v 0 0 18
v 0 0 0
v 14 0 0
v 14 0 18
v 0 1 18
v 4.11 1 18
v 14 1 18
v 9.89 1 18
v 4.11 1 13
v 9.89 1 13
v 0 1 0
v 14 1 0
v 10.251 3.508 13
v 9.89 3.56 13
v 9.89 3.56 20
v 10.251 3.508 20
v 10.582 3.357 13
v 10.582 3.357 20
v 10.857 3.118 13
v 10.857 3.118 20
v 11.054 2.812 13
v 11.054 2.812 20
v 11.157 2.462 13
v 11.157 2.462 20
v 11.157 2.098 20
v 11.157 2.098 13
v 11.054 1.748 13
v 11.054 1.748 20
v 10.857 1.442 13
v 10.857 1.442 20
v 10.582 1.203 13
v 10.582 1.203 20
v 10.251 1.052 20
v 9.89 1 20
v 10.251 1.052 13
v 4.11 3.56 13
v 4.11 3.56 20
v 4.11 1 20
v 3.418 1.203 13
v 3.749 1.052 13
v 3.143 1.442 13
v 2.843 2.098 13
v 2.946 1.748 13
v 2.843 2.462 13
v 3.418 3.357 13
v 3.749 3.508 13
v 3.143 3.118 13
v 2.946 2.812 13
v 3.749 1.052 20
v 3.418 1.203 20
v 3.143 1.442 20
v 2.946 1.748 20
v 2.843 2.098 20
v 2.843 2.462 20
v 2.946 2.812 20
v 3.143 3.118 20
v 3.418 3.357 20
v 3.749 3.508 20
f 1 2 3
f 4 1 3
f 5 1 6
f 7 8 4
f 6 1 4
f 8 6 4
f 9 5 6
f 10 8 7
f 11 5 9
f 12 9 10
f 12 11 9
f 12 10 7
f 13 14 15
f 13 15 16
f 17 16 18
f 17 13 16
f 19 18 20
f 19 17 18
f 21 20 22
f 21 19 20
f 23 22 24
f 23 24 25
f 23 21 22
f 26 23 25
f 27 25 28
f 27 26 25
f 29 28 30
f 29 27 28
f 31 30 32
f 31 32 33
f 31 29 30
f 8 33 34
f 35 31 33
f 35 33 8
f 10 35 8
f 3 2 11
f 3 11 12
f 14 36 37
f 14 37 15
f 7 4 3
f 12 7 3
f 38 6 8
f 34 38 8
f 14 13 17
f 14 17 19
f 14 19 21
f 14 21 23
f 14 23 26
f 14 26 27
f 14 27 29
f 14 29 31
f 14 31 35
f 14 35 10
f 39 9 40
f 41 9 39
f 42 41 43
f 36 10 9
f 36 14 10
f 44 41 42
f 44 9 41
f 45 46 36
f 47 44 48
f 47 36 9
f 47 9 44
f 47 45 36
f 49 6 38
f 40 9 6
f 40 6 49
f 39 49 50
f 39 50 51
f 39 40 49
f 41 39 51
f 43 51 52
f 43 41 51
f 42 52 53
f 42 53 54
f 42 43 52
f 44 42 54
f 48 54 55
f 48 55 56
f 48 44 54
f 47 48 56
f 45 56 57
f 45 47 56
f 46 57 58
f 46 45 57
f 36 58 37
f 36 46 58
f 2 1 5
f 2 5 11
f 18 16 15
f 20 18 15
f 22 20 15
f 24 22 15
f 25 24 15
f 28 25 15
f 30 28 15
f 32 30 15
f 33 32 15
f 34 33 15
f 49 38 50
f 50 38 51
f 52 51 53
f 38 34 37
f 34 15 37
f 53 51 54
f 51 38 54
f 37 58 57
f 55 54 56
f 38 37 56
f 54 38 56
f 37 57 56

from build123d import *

# Parameters (mm, degrees)
SKETCH1_W                = 14
SKETCH1_H                = 18
BOSS_EXTRUDE1_DEPTH      = 1
BOSS_EXTRUDE2_DEPTH      = 2
BOSS_EXTRUDE2_DEPTH_BACK = 5
SKETCH2_W                = 5.78
SKETCH2_H                = 2.56


with BuildPart() as part:
    # Sketch1 → Boss-Extrude1 (new body)
    with BuildSketch(Plane(origin=(0, 0, 0), x_dir=(1, 0, 0), z_dir=(0, 1, 0))):
        with Locations((7, -9)):
            Rectangle(SKETCH1_W, SKETCH1_H)
    extrude(amount=BOSS_EXTRUDE1_DEPTH)

    # Sketch2 → Boss-Extrude2 (add, two sides: drawn at the far end of the back side and taken through both)
    with BuildSketch(Plane.XY.offset(18).offset(-BOSS_EXTRUDE2_DEPTH_BACK)):
        with BuildLine():
            Line((4.11, 3.56), (4.11, 1))
            ThreePointArc((4.11, 1), (2.83, 2.28), (4.11, 3.56))
        make_face()
        with Locations((7, 2.28)):
            Rectangle(SKETCH2_W, SKETCH2_H)
        with BuildLine():
            ThreePointArc((9.89, 3.56), (11.17, 2.28), (9.89, 1))
            Line((9.89, 1), (9.89, 3.56))
        make_face()
    extrude(amount=BOSS_EXTRUDE2_DEPTH + BOSS_EXTRUDE2_DEPTH_BACK)


solid = part.part
